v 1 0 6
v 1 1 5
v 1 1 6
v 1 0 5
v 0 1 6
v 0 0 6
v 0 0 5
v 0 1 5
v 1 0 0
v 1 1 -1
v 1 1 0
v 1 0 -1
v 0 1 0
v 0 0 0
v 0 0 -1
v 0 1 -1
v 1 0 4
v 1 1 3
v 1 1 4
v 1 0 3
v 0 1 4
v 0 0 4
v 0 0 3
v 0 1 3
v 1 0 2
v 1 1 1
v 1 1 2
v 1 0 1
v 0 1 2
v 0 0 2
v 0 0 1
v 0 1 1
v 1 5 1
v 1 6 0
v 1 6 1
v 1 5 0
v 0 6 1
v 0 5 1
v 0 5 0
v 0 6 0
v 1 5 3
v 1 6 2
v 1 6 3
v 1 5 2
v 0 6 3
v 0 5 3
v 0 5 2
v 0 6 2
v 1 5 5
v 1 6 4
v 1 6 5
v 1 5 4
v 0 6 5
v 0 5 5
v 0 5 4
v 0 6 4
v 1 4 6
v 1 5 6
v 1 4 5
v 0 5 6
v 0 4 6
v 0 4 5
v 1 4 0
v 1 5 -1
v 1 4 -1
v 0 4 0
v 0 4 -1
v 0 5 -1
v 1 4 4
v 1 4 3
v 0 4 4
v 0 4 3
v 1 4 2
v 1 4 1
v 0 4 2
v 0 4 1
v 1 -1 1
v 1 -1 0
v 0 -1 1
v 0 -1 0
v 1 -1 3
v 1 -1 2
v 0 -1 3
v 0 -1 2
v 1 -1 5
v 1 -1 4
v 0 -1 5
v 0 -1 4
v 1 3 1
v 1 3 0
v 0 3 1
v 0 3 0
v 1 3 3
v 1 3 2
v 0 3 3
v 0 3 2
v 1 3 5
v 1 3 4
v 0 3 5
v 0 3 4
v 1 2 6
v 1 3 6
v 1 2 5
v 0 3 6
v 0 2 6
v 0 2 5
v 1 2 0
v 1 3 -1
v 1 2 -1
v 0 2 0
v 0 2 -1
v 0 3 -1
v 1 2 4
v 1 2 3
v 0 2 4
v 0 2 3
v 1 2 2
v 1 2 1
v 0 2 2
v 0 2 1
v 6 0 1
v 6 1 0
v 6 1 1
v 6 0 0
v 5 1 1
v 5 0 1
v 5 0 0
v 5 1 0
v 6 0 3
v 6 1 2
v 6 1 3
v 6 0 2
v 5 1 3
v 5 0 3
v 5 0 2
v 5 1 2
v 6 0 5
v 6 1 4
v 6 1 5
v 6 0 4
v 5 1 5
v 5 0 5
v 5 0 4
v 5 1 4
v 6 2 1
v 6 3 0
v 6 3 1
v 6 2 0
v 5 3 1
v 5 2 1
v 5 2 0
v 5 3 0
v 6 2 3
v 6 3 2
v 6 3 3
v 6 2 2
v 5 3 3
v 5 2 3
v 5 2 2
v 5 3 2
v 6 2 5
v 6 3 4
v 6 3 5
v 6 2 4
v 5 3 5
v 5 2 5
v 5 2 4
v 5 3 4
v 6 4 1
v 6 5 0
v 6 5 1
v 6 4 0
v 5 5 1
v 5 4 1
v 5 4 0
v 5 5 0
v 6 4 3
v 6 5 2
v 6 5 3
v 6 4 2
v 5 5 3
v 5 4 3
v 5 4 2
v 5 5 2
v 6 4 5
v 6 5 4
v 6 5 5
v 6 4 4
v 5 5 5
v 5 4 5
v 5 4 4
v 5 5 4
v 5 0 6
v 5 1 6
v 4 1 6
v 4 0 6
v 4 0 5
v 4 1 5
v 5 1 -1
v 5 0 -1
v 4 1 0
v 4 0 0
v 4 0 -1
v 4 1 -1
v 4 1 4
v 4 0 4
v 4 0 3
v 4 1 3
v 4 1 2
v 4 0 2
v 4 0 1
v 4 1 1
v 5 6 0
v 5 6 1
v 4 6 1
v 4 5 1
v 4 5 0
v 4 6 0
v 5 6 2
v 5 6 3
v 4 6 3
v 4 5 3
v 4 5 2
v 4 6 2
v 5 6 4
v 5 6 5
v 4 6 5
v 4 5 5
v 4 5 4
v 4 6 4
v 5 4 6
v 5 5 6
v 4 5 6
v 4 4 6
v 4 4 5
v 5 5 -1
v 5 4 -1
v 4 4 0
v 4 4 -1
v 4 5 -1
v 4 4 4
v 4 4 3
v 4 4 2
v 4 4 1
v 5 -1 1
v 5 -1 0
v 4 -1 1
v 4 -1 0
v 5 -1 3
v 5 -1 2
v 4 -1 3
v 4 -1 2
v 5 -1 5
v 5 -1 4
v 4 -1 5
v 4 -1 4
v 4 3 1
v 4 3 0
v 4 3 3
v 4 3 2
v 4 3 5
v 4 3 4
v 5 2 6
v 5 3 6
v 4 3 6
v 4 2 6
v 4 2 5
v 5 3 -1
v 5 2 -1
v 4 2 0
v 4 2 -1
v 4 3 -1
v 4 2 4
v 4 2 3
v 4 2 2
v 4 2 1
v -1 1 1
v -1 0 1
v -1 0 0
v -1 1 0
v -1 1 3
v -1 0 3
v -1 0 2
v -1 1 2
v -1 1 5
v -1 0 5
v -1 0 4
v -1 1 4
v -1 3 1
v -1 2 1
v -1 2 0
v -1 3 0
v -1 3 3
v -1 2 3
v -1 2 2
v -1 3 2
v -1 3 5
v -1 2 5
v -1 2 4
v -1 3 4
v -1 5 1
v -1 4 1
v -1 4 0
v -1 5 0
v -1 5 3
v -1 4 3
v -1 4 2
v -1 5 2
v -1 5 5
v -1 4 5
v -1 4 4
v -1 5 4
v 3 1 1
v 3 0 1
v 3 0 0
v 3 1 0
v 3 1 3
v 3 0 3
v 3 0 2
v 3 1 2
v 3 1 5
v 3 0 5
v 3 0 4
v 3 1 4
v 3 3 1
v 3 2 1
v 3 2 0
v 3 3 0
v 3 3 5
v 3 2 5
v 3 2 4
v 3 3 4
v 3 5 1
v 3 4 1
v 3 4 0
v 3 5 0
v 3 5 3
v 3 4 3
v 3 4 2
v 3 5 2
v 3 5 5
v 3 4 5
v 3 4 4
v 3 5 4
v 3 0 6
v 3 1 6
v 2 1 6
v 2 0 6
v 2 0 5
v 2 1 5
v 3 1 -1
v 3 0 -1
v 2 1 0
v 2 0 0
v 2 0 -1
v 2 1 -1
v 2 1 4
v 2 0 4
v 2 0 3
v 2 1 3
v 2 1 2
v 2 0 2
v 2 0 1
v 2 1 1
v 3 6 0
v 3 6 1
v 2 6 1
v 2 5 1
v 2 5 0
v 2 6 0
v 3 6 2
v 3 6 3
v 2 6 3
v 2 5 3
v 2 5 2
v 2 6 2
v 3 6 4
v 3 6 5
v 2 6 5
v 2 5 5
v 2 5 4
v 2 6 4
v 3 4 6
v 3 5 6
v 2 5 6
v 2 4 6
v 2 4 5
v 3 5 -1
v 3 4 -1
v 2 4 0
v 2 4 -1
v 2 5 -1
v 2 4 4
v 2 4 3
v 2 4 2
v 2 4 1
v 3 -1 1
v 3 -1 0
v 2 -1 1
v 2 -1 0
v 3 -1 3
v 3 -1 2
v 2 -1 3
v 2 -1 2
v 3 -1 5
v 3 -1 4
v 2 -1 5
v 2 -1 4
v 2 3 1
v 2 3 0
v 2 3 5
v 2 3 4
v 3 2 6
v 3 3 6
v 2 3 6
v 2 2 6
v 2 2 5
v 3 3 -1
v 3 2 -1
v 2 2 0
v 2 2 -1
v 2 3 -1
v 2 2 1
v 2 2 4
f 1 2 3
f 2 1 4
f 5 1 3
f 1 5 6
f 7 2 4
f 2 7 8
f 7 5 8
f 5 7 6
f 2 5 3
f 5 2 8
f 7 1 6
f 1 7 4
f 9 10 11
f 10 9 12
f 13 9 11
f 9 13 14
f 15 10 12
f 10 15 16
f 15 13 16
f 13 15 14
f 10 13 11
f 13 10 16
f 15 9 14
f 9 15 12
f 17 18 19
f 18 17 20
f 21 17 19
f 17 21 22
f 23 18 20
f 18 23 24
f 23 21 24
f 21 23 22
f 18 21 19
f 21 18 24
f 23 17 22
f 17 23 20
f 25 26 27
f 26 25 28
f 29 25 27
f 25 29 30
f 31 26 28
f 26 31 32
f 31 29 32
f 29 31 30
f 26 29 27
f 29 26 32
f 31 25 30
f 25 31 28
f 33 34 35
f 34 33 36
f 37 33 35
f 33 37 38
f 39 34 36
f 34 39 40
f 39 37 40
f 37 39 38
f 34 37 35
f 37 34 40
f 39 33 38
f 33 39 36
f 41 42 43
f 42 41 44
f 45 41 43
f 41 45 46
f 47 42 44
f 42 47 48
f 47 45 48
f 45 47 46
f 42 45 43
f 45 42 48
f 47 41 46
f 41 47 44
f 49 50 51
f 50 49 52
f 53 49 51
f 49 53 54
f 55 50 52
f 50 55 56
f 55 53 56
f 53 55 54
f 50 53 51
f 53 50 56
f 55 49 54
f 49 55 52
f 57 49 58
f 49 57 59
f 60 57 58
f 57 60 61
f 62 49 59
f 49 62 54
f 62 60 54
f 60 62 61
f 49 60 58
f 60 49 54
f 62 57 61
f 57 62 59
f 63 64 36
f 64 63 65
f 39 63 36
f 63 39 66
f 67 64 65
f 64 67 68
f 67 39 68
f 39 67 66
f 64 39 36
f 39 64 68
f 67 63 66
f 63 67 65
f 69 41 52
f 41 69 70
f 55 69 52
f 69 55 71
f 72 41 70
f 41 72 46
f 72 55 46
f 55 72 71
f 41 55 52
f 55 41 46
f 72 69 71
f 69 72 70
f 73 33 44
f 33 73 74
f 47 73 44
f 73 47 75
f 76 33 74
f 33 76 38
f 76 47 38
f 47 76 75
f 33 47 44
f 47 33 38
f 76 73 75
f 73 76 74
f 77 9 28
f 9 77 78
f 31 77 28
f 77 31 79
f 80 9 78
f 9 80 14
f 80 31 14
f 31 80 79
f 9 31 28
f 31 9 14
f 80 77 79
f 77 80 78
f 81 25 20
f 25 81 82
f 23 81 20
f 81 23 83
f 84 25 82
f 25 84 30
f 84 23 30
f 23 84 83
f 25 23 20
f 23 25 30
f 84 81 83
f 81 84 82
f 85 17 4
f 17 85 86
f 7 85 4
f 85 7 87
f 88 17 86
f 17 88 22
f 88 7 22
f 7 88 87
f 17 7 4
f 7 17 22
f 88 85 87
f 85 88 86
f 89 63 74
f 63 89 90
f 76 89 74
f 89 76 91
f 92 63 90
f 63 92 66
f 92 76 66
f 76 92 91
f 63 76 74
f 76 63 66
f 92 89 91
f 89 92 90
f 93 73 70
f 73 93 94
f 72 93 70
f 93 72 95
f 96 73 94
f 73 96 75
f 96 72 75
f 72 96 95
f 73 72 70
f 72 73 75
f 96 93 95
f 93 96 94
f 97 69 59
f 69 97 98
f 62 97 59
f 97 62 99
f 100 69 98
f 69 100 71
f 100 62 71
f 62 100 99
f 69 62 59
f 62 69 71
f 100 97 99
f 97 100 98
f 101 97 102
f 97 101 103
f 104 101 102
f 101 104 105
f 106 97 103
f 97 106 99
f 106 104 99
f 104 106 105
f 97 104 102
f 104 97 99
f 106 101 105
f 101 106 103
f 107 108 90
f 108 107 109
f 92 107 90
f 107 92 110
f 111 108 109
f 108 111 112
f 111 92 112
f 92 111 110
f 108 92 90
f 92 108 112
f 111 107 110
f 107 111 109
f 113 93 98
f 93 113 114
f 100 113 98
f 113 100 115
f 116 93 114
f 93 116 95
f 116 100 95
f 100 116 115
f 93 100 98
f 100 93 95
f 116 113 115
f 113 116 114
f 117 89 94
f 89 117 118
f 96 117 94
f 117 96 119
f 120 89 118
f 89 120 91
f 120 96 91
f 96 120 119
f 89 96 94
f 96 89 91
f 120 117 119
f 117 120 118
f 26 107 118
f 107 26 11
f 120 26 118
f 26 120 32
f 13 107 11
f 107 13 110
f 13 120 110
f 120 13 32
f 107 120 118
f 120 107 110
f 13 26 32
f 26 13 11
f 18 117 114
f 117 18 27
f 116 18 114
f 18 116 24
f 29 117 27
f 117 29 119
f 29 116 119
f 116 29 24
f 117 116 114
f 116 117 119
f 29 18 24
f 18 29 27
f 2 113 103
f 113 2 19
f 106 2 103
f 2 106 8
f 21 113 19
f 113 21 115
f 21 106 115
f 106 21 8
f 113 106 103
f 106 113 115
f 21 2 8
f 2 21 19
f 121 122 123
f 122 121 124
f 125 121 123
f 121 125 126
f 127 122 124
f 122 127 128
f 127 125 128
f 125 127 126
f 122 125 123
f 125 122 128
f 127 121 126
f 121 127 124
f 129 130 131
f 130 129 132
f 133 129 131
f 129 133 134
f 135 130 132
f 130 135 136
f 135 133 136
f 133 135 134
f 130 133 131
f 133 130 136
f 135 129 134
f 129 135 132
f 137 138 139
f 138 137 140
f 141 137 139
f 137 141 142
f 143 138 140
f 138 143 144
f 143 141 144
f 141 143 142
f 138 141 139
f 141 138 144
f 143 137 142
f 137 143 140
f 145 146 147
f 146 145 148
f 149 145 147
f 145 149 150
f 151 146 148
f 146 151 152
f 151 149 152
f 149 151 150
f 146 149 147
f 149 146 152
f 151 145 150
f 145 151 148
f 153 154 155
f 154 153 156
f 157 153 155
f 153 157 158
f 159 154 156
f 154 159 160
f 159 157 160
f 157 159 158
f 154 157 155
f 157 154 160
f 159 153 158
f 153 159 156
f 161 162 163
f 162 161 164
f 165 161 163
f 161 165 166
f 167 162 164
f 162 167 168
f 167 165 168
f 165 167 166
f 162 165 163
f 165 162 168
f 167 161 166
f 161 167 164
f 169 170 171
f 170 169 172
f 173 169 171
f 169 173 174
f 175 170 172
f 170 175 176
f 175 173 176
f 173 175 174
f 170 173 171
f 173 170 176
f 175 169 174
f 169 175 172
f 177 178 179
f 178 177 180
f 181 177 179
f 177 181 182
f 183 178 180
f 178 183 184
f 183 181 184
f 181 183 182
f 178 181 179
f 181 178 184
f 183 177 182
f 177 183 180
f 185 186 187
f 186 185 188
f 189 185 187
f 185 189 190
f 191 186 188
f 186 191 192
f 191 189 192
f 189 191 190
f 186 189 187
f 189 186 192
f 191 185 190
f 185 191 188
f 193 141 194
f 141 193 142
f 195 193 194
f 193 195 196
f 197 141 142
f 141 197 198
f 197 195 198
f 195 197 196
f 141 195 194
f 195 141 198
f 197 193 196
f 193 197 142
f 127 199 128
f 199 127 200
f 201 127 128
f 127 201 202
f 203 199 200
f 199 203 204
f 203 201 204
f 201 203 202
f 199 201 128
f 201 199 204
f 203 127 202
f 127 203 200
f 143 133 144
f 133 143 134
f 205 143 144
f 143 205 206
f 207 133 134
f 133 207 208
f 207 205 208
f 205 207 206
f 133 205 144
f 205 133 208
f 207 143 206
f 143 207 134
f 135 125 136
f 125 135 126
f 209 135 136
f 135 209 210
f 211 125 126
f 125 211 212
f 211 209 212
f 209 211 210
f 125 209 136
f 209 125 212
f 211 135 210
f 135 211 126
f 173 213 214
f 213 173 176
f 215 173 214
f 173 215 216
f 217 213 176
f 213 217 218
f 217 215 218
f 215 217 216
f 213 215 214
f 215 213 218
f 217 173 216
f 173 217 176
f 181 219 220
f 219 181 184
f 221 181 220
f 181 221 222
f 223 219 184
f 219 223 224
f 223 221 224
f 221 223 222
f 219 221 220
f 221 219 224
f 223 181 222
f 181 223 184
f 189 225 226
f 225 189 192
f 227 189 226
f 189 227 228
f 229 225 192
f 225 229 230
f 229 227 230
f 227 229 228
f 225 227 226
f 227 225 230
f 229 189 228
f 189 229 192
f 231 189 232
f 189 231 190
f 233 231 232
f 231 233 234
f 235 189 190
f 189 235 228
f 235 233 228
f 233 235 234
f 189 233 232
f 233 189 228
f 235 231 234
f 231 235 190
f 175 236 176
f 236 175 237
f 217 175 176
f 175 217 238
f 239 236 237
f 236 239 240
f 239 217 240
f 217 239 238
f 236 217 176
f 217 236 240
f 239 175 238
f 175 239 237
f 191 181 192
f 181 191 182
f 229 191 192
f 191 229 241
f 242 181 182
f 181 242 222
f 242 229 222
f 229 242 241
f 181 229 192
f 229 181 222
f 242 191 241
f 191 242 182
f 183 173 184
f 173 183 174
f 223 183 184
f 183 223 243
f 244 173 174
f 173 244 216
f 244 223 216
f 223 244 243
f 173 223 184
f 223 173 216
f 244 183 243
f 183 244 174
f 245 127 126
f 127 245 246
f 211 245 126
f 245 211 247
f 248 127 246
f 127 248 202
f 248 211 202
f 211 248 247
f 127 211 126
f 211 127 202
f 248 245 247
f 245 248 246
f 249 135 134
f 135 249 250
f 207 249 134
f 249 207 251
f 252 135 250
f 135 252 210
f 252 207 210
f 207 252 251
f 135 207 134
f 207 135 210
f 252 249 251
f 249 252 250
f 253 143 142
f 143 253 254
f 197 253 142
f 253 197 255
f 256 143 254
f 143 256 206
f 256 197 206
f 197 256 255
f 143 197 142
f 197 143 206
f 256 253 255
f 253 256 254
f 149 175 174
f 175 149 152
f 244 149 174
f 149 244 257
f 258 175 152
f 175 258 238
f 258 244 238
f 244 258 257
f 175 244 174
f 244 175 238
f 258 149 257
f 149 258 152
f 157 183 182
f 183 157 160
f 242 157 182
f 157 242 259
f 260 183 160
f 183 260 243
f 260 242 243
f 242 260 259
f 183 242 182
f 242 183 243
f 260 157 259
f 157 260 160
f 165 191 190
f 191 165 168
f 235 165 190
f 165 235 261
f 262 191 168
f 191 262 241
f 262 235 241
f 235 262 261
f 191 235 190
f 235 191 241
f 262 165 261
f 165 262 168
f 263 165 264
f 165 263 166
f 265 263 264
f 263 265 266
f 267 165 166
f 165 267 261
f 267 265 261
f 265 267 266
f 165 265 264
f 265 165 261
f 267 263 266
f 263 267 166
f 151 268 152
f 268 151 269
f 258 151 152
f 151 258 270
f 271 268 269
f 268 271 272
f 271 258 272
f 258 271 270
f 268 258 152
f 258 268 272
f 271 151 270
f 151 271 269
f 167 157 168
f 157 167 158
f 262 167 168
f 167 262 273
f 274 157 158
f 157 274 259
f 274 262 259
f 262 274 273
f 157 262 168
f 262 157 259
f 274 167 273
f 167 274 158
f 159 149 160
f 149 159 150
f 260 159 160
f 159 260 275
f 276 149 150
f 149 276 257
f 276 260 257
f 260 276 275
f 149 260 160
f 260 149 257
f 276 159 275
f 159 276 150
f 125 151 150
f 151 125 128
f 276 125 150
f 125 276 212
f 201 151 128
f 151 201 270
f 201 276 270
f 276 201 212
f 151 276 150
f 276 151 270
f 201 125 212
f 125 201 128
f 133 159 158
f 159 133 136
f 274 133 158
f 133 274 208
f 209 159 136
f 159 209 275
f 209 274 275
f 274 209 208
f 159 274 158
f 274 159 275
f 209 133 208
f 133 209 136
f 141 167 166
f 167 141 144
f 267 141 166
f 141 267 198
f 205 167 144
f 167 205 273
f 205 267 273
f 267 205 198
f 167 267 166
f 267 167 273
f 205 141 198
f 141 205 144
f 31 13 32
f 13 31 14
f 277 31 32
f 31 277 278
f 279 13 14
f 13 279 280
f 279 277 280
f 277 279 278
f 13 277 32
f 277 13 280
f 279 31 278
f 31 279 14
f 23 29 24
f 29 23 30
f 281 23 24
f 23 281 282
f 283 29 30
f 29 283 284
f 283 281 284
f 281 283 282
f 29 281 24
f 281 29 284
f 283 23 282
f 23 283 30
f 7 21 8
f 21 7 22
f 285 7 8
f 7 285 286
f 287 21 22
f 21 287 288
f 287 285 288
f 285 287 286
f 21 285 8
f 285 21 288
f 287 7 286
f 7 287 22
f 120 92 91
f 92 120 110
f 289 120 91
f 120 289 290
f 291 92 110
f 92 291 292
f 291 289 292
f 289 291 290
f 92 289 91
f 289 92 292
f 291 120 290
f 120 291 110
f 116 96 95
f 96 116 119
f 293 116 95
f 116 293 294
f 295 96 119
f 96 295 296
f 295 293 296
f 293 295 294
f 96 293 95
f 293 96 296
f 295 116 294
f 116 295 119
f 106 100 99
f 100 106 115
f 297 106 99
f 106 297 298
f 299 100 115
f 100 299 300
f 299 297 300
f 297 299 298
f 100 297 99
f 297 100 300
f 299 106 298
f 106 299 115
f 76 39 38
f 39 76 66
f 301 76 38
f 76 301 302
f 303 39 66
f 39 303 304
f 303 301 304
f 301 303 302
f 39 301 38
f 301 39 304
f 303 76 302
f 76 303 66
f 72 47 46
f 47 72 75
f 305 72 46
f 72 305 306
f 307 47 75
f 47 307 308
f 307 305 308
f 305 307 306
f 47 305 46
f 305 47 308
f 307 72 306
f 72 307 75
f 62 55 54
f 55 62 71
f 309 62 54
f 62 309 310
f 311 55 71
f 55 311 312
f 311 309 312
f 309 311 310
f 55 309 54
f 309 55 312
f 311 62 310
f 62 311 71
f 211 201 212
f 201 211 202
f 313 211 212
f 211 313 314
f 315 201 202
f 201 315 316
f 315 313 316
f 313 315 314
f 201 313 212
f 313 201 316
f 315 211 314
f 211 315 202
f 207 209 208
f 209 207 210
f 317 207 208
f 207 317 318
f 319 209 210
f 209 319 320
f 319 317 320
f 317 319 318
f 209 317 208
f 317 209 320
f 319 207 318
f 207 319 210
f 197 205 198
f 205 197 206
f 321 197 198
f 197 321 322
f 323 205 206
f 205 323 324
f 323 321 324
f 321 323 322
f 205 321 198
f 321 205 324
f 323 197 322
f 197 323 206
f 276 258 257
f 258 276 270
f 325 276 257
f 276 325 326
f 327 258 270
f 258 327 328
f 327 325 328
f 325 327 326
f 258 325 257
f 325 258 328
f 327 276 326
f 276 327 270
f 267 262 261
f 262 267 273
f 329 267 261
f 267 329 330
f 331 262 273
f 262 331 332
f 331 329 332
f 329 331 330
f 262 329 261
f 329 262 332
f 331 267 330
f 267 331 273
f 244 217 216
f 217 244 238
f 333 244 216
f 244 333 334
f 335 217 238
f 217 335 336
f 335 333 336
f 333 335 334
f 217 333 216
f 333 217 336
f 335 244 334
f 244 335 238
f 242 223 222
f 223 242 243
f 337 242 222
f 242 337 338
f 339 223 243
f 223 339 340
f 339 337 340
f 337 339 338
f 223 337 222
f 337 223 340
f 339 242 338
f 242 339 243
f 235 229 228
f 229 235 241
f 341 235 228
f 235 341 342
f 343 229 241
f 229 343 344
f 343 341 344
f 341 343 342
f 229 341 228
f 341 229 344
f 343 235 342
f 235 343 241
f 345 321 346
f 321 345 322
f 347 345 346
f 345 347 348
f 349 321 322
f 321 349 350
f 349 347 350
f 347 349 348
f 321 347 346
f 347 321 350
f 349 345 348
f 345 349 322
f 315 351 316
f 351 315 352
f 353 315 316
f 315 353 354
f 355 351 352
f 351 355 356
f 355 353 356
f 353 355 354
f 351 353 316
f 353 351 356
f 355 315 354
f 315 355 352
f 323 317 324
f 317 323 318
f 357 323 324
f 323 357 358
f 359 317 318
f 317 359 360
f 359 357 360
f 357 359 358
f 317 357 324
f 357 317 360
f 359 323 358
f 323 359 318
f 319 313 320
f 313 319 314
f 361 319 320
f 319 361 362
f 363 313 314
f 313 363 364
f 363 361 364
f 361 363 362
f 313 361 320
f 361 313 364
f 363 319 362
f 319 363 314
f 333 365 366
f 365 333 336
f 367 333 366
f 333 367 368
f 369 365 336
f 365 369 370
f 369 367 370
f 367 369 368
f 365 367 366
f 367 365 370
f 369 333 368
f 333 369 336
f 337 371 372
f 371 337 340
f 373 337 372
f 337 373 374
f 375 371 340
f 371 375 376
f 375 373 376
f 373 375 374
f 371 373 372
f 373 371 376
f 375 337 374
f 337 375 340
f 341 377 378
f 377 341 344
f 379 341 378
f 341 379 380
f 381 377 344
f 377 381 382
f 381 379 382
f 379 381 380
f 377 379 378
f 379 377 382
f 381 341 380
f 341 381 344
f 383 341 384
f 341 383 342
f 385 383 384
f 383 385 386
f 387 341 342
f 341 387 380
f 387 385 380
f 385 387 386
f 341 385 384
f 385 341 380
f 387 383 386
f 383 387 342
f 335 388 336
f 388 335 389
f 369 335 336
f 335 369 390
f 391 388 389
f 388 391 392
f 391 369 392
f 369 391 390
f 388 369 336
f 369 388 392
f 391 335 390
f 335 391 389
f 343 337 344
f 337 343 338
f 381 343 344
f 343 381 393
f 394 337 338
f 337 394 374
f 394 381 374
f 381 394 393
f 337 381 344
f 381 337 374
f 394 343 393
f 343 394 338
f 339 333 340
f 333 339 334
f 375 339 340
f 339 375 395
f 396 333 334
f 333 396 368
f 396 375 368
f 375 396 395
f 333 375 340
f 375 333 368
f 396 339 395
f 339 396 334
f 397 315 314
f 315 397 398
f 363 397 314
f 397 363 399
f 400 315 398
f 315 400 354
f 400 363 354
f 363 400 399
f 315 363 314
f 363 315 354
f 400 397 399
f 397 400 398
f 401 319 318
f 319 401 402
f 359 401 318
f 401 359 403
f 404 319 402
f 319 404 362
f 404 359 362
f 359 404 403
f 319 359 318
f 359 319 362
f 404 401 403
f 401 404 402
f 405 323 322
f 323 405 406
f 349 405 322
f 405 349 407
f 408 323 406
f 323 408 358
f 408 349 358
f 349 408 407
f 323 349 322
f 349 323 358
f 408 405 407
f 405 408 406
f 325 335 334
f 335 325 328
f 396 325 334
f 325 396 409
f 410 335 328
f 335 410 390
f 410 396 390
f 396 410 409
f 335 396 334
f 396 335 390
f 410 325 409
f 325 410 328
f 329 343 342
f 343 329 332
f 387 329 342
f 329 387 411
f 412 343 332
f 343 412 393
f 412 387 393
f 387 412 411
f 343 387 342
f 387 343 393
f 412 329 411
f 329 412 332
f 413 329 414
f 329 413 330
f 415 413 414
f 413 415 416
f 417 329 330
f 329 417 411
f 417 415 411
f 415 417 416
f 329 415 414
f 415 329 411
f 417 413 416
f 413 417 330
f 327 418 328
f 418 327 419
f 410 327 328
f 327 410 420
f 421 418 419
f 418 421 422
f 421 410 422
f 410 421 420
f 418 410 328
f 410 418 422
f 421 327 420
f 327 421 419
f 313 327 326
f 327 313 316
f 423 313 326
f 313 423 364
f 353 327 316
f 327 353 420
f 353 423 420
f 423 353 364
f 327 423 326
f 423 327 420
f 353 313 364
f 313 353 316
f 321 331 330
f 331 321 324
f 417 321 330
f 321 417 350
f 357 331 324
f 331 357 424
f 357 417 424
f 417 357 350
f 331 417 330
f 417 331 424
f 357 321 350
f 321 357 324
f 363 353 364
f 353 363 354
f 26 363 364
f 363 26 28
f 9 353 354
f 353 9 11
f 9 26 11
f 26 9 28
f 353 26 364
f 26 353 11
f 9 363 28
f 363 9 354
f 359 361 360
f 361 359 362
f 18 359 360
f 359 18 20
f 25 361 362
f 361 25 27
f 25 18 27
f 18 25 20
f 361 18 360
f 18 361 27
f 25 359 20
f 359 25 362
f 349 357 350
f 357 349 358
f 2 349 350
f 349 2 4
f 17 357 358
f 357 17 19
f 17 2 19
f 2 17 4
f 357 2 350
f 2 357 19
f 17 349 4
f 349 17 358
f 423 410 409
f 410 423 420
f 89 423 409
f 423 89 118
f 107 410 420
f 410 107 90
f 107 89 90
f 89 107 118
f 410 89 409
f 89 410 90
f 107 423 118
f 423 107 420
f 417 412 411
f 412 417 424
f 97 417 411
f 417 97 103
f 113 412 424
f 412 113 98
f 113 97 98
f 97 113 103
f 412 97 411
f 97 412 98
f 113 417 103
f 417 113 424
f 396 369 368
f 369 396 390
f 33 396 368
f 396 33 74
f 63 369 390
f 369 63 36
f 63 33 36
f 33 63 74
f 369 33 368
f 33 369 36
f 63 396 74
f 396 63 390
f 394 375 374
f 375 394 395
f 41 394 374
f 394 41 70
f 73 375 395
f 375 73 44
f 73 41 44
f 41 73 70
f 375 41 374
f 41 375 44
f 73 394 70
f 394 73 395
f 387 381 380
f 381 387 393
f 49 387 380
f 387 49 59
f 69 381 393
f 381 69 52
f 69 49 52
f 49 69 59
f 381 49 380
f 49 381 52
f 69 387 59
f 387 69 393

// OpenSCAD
translate([ 0,  0,  5]) cube(1);
translate([ 0,  0, -1]) cube(1);
translate([ 0,  0,  3]) cube(1);
translate([ 0,  0,  1]) cube(1);
translate([ 0,  5,  0]) cube(1);
translate([ 0,  5,  2]) cube(1);
translate([ 0,  5,  4]) cube(1);
translate([ 0,  4,  5]) cube(1);
translate([ 0,  4, -1]) cube(1);
translate([ 0,  4,  3]) cube(1);
translate([ 0,  4,  1]) cube(1);
translate([ 0, -1,  0]) cube(1);
translate([ 0, -1,  2]) cube(1);
translate([ 0, -1,  4]) cube(1);
translate([ 0,  3,  0]) cube(1);
translate([ 0,  3,  2]) cube(1);
translate([ 0,  3,  4]) cube(1);
translate([ 0,  2,  5]) cube(1);
translate([ 0,  2, -1]) cube(1);
translate([ 0,  2,  3]) cube(1);
translate([ 0,  2,  1]) cube(1);
translate([ 0,  1,  0]) cube(1);
translate([ 0,  1,  2]) cube(1);
translate([ 0,  1,  4]) cube(1);
translate([ 5,  0,  0]) cube(1);
translate([ 5,  0,  2]) cube(1);
translate([ 5,  0,  4]) cube(1);
translate([ 5,  2,  0]) cube(1);
translate([ 5,  2,  2]) cube(1);
translate([ 5,  2,  4]) cube(1);
translate([ 5,  4,  0]) cube(1);
translate([ 5,  4,  2]) cube(1);
translate([ 5,  4,  4]) cube(1);
translate([ 4,  0,  5]) cube(1);
translate([ 4,  0, -1]) cube(1);
translate([ 4,  0,  3]) cube(1);
translate([ 4,  0,  1]) cube(1);
translate([ 4,  5,  0]) cube(1);
translate([ 4,  5,  2]) cube(1);
translate([ 4,  5,  4]) cube(1);
translate([ 4,  4,  5]) cube(1);
translate([ 4,  4, -1]) cube(1);
translate([ 4,  4,  3]) cube(1);
translate([ 4,  4,  1]) cube(1);
translate([ 4, -1,  0]) cube(1);
translate([ 4, -1,  2]) cube(1);
translate([ 4, -1,  4]) cube(1);
translate([ 4,  3,  0]) cube(1);
translate([ 4,  3,  2]) cube(1);
translate([ 4,  3,  4]) cube(1);
translate([ 4,  2,  5]) cube(1);
translate([ 4,  2, -1]) cube(1);
translate([ 4,  2,  3]) cube(1);
translate([ 4,  2,  1]) cube(1);
translate([ 4,  1,  0]) cube(1);
translate([ 4,  1,  2]) cube(1);
translate([ 4,  1,  4]) cube(1);
translate([-1,  0,  0]) cube(1);
translate([-1,  0,  2]) cube(1);
translate([-1,  0,  4]) cube(1);
translate([-1,  2,  0]) cube(1);
translate([-1,  2,  2]) cube(1);
translate([-1,  2,  4]) cube(1);
translate([-1,  4,  0]) cube(1);
translate([-1,  4,  2]) cube(1);
translate([-1,  4,  4]) cube(1);
translate([ 3,  0,  0]) cube(1);
translate([ 3,  0,  2]) cube(1);
translate([ 3,  0,  4]) cube(1);
translate([ 3,  2,  0]) cube(1);
translate([ 3,  2,  4]) cube(1);
translate([ 3,  4,  0]) cube(1);
translate([ 3,  4,  2]) cube(1);
translate([ 3,  4,  4]) cube(1);
translate([ 2,  0,  5]) cube(1);
translate([ 2,  0, -1]) cube(1);
translate([ 2,  0,  3]) cube(1);
translate([ 2,  0,  1]) cube(1);
translate([ 2,  5,  0]) cube(1);
translate([ 2,  5,  2]) cube(1);
translate([ 2,  5,  4]) cube(1);
translate([ 2,  4,  5]) cube(1);
translate([ 2,  4, -1]) cube(1);
translate([ 2,  4,  3]) cube(1);
translate([ 2,  4,  1]) cube(1);
translate([ 2, -1,  0]) cube(1);
translate([ 2, -1,  2]) cube(1);
translate([ 2, -1,  4]) cube(1);
translate([ 2,  3,  0]) cube(1);
translate([ 2,  3,  4]) cube(1);
translate([ 2,  2,  5]) cube(1);
translate([ 2,  2, -1]) cube(1);
translate([ 2,  1,  0]) cube(1);
translate([ 2,  1,  4]) cube(1);
translate([ 1,  0,  0]) cube(1);
translate([ 1,  0,  2]) cube(1);
translate([ 1,  0,  4]) cube(1);
translate([ 1,  2,  0]) cube(1);
translate([ 1,  2,  4]) cube(1);
translate([ 1,  4,  0]) cube(1);
translate([ 1,  4,  2]) cube(1);
translate([ 1,  4,  4]) cube(1);
